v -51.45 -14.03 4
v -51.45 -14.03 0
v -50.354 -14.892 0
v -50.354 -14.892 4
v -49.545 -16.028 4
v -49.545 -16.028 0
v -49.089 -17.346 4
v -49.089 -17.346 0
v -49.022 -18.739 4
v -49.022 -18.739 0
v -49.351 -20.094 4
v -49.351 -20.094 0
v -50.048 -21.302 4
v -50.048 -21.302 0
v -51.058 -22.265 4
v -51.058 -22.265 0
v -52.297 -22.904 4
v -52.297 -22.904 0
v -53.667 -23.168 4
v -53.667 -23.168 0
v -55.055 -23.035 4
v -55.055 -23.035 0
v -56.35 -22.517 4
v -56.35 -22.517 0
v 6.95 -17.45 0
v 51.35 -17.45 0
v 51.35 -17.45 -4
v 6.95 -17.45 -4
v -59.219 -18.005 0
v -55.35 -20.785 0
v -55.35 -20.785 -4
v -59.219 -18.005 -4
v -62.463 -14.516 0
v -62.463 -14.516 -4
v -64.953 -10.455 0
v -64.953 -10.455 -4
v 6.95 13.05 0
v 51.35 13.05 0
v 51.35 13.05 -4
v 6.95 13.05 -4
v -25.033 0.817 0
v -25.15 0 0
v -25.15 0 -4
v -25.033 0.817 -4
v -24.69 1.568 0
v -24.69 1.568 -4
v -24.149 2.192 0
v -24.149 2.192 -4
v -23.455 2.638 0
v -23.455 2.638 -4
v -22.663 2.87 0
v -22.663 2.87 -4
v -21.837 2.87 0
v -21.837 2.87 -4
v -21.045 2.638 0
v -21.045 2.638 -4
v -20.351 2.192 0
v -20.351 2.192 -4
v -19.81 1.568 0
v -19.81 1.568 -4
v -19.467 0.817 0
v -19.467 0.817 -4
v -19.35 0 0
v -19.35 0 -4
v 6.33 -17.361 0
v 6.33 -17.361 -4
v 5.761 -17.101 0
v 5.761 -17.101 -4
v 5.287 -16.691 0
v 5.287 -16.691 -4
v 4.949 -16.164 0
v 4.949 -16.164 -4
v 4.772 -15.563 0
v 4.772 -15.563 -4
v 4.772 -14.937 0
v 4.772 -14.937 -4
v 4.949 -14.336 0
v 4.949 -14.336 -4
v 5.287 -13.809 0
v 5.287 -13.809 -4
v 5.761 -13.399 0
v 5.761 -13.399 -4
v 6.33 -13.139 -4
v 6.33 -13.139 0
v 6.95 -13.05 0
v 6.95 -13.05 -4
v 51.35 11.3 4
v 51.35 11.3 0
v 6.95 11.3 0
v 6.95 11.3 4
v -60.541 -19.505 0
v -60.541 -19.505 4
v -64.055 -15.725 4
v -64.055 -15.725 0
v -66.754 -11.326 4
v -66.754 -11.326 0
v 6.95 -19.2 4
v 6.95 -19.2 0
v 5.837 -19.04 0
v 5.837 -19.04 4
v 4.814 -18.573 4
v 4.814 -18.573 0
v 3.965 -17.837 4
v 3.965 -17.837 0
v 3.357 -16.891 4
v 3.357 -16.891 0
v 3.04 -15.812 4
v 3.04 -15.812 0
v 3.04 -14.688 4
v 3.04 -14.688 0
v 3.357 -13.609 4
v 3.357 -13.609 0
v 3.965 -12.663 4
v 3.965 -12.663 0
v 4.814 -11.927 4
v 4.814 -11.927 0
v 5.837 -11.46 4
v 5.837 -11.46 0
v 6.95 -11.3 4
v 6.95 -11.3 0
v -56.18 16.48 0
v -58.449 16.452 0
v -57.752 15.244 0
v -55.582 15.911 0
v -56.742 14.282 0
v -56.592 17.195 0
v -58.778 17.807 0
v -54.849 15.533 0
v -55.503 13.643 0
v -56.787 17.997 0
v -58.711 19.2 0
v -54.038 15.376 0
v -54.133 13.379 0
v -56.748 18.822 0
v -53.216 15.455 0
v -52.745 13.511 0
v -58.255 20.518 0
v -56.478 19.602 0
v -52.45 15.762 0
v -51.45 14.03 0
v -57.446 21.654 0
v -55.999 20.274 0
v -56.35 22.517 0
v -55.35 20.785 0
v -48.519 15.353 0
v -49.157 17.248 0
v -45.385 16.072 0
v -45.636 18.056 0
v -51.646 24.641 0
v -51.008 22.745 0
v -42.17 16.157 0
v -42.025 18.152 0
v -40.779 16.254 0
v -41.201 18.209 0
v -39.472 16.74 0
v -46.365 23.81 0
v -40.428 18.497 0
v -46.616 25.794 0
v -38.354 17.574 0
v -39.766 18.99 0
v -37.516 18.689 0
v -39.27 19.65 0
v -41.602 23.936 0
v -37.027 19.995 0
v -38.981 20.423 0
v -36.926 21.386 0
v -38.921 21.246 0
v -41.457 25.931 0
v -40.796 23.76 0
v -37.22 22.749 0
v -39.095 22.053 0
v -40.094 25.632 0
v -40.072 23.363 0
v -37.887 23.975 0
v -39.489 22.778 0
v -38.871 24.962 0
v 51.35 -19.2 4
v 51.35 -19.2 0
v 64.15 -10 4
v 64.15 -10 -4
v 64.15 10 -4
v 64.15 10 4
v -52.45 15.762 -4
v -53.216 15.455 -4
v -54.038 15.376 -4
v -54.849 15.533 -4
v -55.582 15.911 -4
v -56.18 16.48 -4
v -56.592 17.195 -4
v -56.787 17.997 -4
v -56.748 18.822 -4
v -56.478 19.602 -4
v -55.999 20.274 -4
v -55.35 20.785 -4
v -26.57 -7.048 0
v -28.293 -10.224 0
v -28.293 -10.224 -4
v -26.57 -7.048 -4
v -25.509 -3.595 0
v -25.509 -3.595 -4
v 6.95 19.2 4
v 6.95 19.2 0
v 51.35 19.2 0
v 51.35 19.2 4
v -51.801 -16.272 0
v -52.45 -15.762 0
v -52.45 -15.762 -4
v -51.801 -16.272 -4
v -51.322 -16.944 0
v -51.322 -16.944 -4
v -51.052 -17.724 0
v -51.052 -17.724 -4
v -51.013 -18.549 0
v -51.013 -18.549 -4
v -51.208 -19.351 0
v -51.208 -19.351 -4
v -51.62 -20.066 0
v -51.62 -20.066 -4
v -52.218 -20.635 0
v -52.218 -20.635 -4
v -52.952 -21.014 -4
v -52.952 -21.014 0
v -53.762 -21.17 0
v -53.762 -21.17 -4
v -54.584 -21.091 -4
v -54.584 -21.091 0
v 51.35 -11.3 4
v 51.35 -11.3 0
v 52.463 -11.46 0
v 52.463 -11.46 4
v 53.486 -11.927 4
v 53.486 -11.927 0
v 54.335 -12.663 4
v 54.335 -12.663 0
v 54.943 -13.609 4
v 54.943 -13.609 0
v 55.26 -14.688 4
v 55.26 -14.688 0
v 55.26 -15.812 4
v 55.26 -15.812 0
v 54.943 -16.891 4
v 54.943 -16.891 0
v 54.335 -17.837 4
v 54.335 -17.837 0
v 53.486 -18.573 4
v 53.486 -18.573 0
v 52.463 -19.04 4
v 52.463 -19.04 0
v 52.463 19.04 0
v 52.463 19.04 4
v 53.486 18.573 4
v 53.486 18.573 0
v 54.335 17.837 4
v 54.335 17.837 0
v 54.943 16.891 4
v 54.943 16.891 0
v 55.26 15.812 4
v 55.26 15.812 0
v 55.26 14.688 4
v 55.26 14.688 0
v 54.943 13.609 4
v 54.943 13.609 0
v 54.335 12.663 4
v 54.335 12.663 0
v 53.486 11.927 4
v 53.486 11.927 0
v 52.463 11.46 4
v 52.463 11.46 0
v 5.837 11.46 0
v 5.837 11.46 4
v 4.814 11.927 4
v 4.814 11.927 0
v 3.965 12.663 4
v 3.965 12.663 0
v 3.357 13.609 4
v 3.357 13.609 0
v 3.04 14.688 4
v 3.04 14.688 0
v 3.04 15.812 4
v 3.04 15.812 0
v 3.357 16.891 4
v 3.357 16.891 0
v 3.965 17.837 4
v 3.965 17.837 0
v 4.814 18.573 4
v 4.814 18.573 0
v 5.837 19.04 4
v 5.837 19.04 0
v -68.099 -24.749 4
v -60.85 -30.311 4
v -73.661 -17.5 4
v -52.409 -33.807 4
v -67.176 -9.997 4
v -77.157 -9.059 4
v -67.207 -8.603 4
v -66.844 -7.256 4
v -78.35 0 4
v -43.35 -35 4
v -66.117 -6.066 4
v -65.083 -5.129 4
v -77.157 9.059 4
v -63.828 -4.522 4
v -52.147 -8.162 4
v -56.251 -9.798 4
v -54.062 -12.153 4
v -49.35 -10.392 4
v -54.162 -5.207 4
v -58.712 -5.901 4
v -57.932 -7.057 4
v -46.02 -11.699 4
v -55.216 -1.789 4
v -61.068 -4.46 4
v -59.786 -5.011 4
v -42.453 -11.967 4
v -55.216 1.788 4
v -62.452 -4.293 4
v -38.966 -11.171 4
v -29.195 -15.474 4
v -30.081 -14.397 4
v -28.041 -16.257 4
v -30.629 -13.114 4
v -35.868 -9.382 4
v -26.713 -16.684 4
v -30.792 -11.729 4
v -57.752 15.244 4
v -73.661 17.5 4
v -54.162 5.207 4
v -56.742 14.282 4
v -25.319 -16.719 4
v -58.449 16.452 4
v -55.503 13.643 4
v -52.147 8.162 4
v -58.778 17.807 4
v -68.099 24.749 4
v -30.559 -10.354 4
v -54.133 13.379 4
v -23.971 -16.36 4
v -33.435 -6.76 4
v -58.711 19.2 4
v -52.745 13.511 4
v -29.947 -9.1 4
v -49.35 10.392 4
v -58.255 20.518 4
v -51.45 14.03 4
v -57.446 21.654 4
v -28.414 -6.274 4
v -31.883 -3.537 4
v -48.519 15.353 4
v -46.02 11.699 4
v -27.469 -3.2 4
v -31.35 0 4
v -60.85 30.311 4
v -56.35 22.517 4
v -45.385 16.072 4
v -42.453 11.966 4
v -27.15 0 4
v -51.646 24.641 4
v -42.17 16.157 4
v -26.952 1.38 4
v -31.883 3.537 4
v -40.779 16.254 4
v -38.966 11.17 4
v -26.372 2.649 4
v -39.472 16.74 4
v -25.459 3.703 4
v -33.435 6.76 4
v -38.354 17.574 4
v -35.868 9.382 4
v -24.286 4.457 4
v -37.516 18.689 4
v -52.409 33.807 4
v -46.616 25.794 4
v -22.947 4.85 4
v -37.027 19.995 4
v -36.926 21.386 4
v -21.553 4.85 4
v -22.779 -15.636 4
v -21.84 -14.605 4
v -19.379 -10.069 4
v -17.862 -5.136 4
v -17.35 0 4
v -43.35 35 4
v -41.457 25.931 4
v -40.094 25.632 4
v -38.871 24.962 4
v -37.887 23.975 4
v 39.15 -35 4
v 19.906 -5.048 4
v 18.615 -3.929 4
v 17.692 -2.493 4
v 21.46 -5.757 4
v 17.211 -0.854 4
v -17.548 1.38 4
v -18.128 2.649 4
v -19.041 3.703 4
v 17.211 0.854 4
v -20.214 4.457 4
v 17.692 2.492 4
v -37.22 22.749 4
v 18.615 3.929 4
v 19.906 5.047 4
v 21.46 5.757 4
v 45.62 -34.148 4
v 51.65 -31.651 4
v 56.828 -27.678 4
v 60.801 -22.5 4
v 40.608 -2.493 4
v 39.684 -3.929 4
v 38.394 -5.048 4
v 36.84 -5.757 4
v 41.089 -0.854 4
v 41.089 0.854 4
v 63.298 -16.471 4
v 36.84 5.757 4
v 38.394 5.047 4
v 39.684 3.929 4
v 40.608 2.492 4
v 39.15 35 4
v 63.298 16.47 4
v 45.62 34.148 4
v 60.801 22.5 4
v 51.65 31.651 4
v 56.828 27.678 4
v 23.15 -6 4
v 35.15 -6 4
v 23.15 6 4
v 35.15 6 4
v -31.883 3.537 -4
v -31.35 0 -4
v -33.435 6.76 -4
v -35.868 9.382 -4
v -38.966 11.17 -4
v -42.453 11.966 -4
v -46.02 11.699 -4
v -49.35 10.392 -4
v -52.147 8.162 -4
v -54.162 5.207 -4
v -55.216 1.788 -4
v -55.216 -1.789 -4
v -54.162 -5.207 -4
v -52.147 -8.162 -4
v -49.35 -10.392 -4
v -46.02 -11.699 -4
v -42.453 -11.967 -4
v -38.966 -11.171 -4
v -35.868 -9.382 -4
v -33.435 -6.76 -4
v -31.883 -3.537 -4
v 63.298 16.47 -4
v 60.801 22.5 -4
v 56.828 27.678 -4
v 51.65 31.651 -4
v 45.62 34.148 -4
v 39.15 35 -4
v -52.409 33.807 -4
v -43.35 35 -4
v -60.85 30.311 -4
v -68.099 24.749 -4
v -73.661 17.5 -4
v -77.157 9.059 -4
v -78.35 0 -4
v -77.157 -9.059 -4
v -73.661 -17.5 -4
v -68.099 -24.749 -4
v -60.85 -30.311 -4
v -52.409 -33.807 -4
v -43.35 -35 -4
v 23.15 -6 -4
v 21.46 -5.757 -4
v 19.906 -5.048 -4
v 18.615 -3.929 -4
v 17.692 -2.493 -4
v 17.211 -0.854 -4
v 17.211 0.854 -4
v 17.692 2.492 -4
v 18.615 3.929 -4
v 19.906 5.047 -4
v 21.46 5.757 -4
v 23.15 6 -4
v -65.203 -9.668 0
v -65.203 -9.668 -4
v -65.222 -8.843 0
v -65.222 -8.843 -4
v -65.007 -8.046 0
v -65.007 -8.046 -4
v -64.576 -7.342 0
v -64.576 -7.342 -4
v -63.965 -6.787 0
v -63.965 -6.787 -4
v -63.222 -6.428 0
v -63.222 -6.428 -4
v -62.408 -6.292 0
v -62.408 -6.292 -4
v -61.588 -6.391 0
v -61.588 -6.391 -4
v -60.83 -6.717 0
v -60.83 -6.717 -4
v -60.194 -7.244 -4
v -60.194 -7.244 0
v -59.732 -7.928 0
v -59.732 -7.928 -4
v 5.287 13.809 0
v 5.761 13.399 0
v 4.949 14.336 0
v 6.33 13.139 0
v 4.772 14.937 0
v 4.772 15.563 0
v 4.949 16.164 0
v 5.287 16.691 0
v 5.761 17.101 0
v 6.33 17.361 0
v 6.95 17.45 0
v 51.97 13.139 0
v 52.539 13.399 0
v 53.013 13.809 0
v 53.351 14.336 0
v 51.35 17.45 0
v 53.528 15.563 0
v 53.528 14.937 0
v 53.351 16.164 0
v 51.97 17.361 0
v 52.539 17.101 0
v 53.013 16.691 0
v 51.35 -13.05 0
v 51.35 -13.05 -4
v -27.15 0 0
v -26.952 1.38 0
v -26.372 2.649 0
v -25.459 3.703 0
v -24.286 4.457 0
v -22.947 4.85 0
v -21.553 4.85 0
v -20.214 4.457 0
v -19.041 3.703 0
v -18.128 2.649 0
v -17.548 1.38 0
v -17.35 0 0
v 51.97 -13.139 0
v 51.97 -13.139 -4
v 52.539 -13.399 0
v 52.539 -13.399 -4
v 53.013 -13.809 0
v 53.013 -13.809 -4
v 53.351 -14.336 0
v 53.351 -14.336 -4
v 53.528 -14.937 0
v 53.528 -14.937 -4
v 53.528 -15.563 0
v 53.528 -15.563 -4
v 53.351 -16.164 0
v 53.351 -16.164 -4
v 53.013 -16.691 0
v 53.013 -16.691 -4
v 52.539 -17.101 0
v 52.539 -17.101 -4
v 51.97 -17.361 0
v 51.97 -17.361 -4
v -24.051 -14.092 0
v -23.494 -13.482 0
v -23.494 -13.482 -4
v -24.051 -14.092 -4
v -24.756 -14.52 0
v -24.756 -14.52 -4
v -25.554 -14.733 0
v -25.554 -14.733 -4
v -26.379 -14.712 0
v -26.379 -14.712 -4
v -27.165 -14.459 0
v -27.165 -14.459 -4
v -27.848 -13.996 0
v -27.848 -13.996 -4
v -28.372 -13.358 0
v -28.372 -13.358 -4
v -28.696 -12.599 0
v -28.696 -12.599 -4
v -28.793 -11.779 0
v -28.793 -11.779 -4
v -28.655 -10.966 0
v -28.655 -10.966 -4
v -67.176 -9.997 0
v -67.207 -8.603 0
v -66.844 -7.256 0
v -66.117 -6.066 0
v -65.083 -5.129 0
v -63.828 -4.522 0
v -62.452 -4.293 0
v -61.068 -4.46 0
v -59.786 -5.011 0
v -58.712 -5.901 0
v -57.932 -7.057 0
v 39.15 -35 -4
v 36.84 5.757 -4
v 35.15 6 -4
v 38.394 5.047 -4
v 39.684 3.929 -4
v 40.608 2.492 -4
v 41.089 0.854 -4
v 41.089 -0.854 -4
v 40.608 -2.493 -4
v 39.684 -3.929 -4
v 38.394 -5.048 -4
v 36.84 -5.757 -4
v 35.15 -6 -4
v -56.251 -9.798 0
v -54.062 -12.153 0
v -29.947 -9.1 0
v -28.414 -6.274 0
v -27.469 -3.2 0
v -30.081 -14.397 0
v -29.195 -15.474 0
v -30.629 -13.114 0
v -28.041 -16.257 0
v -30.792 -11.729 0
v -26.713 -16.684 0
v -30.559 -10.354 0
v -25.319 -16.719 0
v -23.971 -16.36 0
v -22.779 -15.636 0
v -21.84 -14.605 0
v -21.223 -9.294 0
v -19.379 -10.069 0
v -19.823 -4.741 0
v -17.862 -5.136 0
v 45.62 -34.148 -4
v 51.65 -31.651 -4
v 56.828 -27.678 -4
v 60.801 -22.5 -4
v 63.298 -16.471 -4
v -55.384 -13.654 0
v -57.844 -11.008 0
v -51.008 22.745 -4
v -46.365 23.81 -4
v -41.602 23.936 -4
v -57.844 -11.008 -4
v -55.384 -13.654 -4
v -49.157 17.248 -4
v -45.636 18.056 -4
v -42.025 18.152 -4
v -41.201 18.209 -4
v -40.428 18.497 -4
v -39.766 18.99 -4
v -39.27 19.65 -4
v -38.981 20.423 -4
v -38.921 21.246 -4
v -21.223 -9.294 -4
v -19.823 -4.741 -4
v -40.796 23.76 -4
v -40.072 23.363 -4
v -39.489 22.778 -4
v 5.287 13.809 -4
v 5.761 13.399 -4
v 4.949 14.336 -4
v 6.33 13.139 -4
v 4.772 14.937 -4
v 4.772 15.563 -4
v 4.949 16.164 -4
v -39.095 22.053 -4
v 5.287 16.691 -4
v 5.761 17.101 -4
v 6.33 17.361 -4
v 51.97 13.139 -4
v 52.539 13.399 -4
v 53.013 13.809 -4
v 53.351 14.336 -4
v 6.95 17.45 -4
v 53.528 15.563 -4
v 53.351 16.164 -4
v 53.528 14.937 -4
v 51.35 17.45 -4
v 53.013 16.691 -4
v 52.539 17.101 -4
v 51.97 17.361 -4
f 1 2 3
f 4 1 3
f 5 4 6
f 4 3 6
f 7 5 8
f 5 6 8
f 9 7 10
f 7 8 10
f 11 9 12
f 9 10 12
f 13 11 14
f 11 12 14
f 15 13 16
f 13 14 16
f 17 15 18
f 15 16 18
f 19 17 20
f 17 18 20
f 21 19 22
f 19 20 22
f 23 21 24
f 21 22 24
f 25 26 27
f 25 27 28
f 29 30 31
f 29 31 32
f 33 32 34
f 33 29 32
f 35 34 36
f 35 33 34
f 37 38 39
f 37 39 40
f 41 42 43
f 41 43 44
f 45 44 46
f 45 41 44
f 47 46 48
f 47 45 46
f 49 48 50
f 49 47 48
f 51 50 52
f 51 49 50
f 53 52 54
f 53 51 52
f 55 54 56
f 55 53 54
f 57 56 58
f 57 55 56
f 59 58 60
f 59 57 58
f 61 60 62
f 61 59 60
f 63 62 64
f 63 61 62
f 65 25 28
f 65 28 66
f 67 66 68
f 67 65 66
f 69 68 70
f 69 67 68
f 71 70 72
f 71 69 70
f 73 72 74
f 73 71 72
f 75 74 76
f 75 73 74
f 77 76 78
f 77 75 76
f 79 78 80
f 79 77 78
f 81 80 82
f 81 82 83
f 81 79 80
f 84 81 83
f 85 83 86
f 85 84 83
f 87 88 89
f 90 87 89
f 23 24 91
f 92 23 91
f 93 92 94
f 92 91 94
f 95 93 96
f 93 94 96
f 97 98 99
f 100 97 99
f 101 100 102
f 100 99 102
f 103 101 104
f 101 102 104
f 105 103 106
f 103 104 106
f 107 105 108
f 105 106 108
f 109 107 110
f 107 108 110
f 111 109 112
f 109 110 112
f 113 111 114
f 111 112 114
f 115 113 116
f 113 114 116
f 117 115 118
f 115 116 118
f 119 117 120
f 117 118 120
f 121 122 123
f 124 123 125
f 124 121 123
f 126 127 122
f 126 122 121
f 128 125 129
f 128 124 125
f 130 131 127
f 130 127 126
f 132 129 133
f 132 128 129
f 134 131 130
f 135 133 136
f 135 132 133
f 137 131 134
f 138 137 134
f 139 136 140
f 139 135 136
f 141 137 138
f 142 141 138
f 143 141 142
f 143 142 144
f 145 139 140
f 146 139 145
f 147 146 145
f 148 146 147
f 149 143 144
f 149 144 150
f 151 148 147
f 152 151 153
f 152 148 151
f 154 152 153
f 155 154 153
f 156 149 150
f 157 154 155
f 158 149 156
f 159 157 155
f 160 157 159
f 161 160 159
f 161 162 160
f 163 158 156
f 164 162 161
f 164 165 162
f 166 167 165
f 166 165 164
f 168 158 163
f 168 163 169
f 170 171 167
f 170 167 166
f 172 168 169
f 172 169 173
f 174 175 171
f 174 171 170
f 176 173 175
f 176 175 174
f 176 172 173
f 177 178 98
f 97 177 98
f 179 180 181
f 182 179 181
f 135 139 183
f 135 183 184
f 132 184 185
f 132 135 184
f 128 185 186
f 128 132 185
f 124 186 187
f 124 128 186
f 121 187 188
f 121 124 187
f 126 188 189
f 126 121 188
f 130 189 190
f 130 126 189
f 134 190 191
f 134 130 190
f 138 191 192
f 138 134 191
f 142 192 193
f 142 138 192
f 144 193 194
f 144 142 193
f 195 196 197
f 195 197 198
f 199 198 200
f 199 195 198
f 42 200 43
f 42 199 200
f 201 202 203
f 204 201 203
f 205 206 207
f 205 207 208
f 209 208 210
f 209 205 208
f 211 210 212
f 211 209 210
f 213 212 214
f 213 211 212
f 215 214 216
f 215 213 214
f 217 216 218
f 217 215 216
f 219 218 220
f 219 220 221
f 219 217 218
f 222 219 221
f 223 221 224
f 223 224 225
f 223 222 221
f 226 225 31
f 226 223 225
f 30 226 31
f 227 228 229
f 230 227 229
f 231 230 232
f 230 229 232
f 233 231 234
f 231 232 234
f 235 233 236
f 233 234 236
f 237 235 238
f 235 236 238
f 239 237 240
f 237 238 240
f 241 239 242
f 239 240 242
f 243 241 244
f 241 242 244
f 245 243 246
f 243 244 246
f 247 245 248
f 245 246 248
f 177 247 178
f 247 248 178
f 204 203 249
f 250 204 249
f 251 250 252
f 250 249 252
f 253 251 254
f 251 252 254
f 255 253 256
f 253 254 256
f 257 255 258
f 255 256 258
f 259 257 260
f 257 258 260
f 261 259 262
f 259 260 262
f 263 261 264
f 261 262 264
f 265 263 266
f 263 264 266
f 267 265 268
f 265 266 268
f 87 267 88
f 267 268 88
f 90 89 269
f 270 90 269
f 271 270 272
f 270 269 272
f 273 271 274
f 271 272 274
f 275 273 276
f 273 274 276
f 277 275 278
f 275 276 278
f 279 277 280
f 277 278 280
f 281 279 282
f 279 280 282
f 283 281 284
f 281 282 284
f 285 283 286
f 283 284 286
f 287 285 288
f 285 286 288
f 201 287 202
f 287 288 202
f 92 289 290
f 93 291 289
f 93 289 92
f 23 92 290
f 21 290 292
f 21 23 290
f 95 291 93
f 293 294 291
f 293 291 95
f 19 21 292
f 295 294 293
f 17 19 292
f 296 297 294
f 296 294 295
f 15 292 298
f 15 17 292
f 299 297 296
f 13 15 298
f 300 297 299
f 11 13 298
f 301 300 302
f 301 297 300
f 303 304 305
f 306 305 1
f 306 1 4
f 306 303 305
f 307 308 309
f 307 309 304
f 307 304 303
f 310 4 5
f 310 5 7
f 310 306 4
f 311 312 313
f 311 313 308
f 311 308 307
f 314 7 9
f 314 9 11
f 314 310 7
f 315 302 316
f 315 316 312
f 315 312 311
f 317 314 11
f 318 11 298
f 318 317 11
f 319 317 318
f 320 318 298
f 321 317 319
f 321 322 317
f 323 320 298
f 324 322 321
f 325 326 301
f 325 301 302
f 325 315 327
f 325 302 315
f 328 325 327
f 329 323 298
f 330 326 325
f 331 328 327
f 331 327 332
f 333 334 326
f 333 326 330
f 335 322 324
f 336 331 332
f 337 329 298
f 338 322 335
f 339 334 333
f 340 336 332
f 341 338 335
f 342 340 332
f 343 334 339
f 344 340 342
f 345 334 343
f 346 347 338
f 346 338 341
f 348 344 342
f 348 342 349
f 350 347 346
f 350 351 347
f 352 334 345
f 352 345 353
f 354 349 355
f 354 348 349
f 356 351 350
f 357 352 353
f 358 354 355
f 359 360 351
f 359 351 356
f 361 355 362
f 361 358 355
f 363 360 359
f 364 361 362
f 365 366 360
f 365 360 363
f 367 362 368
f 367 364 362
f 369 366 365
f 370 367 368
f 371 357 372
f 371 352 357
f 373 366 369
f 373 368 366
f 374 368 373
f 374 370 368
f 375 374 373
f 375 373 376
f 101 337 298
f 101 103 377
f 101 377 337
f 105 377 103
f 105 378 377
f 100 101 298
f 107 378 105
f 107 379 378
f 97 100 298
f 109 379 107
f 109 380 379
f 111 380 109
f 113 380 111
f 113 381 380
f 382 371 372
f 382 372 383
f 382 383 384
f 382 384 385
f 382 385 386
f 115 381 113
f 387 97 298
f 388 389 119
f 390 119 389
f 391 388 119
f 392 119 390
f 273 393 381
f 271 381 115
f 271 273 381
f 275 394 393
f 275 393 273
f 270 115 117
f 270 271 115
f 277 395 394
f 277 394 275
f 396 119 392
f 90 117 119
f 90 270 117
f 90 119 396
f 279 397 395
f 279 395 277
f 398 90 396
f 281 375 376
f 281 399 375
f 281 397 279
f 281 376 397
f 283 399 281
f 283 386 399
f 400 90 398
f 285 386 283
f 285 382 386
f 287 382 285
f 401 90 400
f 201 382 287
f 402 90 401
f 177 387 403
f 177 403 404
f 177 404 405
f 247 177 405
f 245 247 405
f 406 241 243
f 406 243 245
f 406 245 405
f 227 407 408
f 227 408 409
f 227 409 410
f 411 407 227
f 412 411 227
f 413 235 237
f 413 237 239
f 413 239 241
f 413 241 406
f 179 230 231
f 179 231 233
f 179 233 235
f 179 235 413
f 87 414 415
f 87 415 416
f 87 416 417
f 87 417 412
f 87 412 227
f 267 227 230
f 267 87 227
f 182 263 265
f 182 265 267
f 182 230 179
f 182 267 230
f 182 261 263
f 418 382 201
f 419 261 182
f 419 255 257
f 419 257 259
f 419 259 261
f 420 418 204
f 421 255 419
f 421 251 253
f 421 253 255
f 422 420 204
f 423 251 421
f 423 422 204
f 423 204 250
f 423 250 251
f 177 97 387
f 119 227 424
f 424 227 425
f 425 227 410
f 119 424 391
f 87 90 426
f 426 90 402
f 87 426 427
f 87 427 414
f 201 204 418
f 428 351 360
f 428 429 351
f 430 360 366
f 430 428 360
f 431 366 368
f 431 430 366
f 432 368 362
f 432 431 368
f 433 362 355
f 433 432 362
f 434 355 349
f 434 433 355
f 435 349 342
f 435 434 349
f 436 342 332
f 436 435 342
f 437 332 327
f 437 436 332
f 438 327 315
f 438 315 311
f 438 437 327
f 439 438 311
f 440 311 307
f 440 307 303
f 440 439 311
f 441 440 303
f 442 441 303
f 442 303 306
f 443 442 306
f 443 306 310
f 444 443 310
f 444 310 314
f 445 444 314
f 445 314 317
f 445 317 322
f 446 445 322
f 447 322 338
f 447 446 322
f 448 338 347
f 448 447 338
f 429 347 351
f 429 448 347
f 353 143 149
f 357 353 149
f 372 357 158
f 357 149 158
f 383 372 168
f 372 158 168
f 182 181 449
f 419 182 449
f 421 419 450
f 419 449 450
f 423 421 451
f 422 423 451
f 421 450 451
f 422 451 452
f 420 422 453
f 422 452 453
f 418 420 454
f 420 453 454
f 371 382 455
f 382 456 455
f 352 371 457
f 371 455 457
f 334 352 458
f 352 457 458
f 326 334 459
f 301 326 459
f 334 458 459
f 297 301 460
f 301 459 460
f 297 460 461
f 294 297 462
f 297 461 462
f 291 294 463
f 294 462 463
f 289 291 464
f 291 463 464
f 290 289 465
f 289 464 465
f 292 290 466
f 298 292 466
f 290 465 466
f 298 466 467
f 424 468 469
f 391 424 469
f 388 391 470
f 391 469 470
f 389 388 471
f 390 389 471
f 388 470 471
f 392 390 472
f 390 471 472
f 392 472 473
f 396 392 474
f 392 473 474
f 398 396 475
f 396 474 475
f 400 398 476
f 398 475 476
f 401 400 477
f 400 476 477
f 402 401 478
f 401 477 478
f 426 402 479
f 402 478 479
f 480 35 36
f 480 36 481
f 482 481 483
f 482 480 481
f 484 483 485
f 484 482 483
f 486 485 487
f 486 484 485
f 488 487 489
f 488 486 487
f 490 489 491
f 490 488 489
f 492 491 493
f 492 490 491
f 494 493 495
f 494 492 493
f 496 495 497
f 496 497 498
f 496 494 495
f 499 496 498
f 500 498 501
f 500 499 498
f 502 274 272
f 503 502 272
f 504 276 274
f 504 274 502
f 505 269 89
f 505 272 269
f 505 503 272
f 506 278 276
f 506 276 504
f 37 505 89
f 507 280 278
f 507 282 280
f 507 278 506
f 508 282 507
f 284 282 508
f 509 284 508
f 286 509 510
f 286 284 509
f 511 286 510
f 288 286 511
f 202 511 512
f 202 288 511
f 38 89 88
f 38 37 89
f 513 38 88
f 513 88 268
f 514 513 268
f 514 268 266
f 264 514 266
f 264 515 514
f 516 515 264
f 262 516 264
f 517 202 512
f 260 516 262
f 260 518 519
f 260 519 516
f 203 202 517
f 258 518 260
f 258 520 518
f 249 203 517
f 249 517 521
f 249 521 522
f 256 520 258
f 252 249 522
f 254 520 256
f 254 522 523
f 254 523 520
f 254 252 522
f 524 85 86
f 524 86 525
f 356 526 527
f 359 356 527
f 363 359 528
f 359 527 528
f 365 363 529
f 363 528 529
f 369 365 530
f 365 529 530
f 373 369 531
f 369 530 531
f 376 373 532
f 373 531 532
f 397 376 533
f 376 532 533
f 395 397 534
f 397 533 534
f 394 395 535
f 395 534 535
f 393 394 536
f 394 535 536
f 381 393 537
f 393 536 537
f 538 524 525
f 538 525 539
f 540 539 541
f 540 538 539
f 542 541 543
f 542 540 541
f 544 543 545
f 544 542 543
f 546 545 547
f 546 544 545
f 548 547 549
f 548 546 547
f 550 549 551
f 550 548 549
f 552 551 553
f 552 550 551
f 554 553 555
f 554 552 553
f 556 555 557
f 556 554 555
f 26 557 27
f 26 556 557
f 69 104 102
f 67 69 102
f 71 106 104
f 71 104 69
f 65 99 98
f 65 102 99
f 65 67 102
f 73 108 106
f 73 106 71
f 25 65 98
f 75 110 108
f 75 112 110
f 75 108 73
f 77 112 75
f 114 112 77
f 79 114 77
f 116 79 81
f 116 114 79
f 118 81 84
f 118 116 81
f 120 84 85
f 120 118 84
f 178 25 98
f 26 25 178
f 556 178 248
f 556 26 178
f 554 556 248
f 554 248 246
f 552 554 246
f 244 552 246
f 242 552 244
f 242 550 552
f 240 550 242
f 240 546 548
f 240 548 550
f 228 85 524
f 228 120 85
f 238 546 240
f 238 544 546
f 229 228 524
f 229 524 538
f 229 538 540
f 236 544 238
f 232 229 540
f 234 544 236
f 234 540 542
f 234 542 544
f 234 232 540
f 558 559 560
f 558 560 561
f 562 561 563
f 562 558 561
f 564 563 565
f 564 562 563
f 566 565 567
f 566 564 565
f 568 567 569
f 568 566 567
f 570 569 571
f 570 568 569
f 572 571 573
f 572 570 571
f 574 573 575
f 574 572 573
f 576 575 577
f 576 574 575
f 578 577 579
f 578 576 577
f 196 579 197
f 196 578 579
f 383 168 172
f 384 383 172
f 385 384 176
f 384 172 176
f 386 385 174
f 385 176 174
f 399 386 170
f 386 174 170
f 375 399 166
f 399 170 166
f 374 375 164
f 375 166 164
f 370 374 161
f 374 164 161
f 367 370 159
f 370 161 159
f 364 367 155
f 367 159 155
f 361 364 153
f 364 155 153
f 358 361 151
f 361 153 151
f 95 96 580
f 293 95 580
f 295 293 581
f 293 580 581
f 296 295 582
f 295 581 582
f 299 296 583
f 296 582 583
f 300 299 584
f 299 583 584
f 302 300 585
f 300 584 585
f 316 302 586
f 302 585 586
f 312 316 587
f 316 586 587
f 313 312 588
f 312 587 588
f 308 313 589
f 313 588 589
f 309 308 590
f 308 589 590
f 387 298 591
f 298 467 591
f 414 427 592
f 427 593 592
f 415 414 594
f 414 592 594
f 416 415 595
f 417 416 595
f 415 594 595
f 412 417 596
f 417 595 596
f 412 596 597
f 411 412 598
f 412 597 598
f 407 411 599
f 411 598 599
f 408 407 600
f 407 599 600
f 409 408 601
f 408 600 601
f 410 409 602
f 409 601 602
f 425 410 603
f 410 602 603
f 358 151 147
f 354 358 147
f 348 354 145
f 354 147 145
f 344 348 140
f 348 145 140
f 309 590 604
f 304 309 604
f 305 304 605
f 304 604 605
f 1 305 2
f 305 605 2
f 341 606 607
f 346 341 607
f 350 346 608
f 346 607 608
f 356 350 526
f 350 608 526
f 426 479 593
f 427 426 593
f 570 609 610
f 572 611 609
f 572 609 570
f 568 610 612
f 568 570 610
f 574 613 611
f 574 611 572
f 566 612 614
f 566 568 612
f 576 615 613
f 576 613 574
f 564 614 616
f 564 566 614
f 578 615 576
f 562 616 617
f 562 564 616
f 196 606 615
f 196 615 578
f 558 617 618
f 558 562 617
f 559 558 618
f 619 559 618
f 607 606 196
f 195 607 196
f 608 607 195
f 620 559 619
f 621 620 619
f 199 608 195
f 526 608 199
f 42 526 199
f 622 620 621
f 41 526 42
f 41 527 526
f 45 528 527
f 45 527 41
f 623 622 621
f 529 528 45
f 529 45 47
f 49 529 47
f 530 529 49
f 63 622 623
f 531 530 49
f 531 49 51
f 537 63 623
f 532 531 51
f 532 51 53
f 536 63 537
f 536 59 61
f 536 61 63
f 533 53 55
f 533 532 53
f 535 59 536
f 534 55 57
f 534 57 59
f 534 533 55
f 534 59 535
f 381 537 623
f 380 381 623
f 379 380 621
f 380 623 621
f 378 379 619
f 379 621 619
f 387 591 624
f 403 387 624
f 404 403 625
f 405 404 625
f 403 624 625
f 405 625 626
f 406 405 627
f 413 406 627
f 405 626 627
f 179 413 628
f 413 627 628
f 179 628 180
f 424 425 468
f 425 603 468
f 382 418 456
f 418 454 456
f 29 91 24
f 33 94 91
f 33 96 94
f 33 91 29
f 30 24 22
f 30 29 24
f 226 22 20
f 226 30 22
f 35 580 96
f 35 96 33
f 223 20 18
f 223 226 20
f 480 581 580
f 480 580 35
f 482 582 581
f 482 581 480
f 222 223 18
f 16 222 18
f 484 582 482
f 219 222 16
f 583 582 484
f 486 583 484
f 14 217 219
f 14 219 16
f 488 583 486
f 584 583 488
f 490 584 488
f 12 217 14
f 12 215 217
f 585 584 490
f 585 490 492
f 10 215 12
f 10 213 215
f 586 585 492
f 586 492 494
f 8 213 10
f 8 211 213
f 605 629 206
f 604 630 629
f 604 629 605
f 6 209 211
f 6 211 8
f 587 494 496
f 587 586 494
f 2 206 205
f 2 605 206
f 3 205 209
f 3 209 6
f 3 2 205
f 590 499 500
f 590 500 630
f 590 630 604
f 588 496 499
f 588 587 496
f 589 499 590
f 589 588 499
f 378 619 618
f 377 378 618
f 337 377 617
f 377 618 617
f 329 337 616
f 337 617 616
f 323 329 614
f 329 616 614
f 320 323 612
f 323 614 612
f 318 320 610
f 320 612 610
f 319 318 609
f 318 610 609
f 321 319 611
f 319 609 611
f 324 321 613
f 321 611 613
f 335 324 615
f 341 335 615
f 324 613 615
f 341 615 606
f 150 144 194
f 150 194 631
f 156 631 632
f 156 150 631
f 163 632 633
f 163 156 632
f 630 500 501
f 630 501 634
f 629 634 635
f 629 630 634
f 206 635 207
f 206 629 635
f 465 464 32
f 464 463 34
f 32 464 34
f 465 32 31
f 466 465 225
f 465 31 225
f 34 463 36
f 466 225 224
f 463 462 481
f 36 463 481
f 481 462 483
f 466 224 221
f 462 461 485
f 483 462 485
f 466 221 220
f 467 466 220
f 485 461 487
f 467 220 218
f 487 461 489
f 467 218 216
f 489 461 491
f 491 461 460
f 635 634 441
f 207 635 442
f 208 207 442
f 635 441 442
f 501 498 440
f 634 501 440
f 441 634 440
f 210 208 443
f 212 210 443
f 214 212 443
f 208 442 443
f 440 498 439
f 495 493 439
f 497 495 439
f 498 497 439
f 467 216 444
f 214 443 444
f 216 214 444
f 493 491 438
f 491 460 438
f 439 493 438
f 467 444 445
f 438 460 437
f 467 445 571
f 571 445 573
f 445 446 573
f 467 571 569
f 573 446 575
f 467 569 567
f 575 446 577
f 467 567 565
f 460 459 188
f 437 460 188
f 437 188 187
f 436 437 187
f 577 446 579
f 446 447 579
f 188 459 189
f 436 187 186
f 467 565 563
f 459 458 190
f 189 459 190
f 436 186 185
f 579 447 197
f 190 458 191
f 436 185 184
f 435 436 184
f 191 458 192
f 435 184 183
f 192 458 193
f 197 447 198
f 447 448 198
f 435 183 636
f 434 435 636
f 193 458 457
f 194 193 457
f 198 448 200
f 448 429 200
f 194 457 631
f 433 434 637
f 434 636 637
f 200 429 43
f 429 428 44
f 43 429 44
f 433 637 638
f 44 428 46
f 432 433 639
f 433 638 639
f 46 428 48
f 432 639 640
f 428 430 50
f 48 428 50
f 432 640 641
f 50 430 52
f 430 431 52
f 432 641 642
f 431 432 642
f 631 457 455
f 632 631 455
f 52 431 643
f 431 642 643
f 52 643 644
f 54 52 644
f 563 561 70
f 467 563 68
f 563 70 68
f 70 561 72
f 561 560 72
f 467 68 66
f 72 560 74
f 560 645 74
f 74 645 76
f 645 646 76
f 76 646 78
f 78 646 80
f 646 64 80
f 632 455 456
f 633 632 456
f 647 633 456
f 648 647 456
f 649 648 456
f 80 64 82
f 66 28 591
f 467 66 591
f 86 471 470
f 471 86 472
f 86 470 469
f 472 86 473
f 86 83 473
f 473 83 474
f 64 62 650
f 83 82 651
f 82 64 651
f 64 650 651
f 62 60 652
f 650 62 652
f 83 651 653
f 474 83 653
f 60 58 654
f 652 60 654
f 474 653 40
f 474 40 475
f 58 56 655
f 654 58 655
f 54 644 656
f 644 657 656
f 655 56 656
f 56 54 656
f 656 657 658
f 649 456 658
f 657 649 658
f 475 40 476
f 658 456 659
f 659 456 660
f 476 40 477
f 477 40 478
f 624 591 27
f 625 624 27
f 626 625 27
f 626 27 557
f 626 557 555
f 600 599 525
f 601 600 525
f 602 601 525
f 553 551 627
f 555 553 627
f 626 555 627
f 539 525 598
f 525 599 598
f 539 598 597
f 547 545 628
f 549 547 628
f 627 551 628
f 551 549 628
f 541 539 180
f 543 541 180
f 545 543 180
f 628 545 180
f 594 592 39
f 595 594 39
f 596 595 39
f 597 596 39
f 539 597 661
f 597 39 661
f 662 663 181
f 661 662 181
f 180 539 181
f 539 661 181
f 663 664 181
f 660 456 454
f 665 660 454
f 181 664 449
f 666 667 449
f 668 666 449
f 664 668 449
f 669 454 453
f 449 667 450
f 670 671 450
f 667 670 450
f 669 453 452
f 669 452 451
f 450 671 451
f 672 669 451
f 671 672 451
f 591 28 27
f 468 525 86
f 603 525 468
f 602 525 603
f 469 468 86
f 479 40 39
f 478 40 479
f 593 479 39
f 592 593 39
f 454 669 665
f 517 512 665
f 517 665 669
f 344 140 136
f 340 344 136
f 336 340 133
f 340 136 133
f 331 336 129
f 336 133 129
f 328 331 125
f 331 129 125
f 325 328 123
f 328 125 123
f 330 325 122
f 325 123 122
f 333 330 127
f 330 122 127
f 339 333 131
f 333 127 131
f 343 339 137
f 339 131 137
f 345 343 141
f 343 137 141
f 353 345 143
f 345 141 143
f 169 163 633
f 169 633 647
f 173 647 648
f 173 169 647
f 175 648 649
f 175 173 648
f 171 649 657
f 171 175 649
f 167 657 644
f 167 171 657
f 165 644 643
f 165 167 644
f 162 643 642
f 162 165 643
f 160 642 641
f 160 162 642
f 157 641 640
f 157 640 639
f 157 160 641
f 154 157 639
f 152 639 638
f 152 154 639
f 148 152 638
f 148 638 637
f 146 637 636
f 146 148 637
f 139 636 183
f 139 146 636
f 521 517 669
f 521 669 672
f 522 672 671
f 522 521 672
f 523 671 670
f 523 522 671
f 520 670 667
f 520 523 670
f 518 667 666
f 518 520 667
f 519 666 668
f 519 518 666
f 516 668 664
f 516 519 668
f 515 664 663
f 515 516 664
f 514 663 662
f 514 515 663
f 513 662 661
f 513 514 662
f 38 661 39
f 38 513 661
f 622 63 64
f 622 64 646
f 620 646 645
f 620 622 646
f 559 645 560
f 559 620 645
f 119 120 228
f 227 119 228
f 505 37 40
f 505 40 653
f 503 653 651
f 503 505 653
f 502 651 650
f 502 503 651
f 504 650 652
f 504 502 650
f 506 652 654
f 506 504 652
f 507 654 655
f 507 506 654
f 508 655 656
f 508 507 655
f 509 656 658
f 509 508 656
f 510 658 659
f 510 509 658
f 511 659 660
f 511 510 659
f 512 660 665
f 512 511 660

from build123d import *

# Parameters (mm, degrees)
F0_R     = 12
F1_DEPTH = 4
F2_DEPTH = 4


# Not quite as in the source:
# - a feature names something its author has since deleted; it is built from what else it names


with BuildPart() as f1:
    # F0 (on Top) → F1 (new body)
    with BuildSketch(Plane.XY):
        with BuildLine():
            ThreePointArc((64.1499952853, 9.9999063548), (56.8276648149, 27.6775758844), (39.1499952853, 34.9999063548))
            Line((39.1499952853, 34.9999063548), (-43.3500047147, 34.9999063548))
            ThreePointArc((-43.3500047147, 34.9999063548), (-78.3500047147, -9.36452e-05), (-43.3500047147, -35.0000936452))
            Line((-43.3500047147, -35.0000936452), (39.1499952853, -35.0000936452))
            ThreePointArc((39.1499952853, -35.0000936452), (56.8276648149, -27.6777631749), (64.1499952853, -10.0000936452))
            Line((64.1499952853, -10.0000936452), (64.1499952853, 9.9999063548))
        make_face()
        with BuildLine():
            ThreePointArc((-66.7535204548, -11.3259689317), (-64.4773497539, -4.780814469), (-57.9321952912, -7.0569851699))
            ThreePointArc((-57.9321952912, -7.0569851699), (-55.2148750657, -11.0302727714), (-51.4500047147, -14.0297051866))
            ThreePointArc((-51.4500047147, -14.0297051866), (-49.6564802362, -20.7232296651), (-56.3500047147, -22.5167541436))
            ThreePointArc((-56.3500047147, -22.5167541436), (-62.3923892286, -17.7028502675), (-66.7535204548, -11.3259689317))
        make_face(mode=Mode.SUBTRACT)
        with BuildLine():
            ThreePointArc((-21.8397511265, -14.6051951708), (-28.6461065134, -15.9065507518), (-29.9474620944, -9.100195365))
            ThreePointArc((-29.9474620944, -9.100195365), (-27.8651542077, -4.7602832187), (-27.1500047147, -9.36452e-05))
            ThreePointArc((-27.1500047147, -9.36452e-05), (-22.2500047147, 4.8999063548), (-17.3500047147, -9.36452e-05))
            ThreePointArc((-17.3500047147, -9.36452e-05), (-18.4977755059, -7.6399040718), (-21.8397511265, -14.6051951708))
        make_face(mode=Mode.SUBTRACT)
        with BuildLine():
            ThreePointArc((6.9499952853, -19.2000936452), (2.9999952853, -15.2500936452), (6.9499952853, -11.3000936452))
            Line((6.9499952853, -11.3000936452), (29.1499952853, -11.3000936452))
            Line((29.1499952853, -11.3000936452), (51.3499952853, -11.3000936452))
            ThreePointArc((51.3499952853, -11.3000936452), (55.2999952853, -15.2500936452), (51.3499952853, -19.2000936452))
            Line((51.3499952853, -19.2000936452), (29.1499952853, -19.2000936452))
            Line((29.1499952853, -19.2000936452), (6.9499952853, -19.2000936452))
        make_face(mode=Mode.SUBTRACT)
        with Locations((-43.3500047147, -9.36452e-05)):
            Circle(F0_R, mode=Mode.SUBTRACT)
        with BuildLine():
            ThreePointArc((-51.4500047147, 14.0295178961), (-58.1435291933, 15.8230423746), (-56.3500047147, 22.5165668531))
            ThreePointArc((-56.3500047147, 22.5165668531), (-49.1598494096, 25.3424734035), (-41.4567425628, 25.9308831667))
            ThreePointArc((-41.4567425628, 25.9308831667), (-36.9265578769, 20.6870842851), (-42.1703567586, 16.1568995991))
            ThreePointArc((-42.1703567586, 16.1568995991), (-46.9699848708, 15.7902750544), (-51.4500047147, 14.0295178961))
        make_face(mode=Mode.SUBTRACT)
        with BuildLine():
            Line((29.1499952853, 5.9999063548), (35.1499952853, 5.9999063548))
            ThreePointArc((35.1499952853, 5.9999063548), (41.1499952853, -9.36452e-05), (35.1499952853, -6.0000936452))
            Line((35.1499952853, -6.0000936452), (29.1499952853, -6.0000936452))
            Line((29.1499952853, -6.0000936452), (23.1499952853, -6.0000936452))
            ThreePointArc((23.1499952853, -6.0000936452), (17.1499952853, -9.36452e-05), (23.1499952853, 5.9999063548))
            Line((23.1499952853, 5.9999063548), (29.1499952853, 5.9999063548))
        make_face(mode=Mode.SUBTRACT)
        with BuildLine():
            Line((29.1499952853, 11.2999063548), (6.9499952853, 11.2999063548))
            ThreePointArc((6.9499952853, 11.2999063548), (2.9999952853, 15.2499063548), (6.9499952853, 19.1999063548))
            Line((6.9499952853, 19.1999063548), (29.1499952853, 19.1999063548))
            Line((29.1499952853, 19.1999063548), (51.3499952853, 19.1999063548))
            ThreePointArc((51.3499952853, 19.1999063548), (55.2999952853, 15.2499063548), (51.3499952853, 11.2999063548))
            Line((51.3499952853, 11.2999063548), (29.1499952853, 11.2999063548))
        make_face(mode=Mode.SUBTRACT)
        with BuildLine():
            ThreePointArc((-41.4567425628, 25.9308831667), (-49.1598494096, 25.3424734035), (-56.3500047147, 22.5165668531))
            ThreePointArc((-56.3500047147, 22.5165668531), (-58.1435291933, 15.8230423746), (-51.4500047147, 14.0295178961))
            ThreePointArc((-51.4500047147, 14.0295178961), (-46.9699848708, 15.7902750544), (-42.1703567586, 16.1568995991))
            ThreePointArc((-42.1703567586, 16.1568995991), (-36.9265578769, 20.6870842851), (-41.4567425628, 25.9308831667))
        make_face()
        with BuildLine():
            ThreePointArc((-52.4500047147, 15.7615687036), (-56.4114783857, 16.8230423746), (-55.3500047147, 20.7845160456))
            ThreePointArc((-55.3500047147, 20.7845160456), (-48.7129382793, 23.393045169), (-41.602378113, 23.9361926427))
            ThreePointArc((-41.602378113, 23.9361926427), (-38.9212484009, 20.8327198352), (-42.0247212084, 18.1515901231))
            ThreePointArc((-42.0247212084, 18.1515901231), (-47.4168960012, 17.7397032889), (-52.4500047147, 15.7615687036))
        make_face(mode=Mode.SUBTRACT)
        with BuildLine():
            ThreePointArc((-27.1500047147, -9.36452e-05), (-27.8651542077, -4.7602832187), (-29.9474620944, -9.100195365))
            ThreePointArc((-29.9474620944, -9.100195365), (-28.6461065134, -15.9065507518), (-21.8397511265, -14.6051951708))
            ThreePointArc((-21.8397511265, -14.6051951708), (-18.4977755059, -7.6399040718), (-17.3500047147, -9.36452e-05))
            ThreePointArc((-17.3500047147, -9.36452e-05), (-22.2500047147, 4.8999063548), (-27.1500047147, -9.36452e-05))
        make_face()
        with BuildLine():
            ThreePointArc((-23.4943860179, -13.4817258227), (-27.5226371652, -14.2519158604), (-28.292827203, -10.2236647131))
            ThreePointArc((-28.292827203, -10.2236647131), (-25.9534442686, -5.3479609438), (-25.1500047147, -9.36452e-05))
            ThreePointArc((-25.1500047147, -9.36452e-05), (-22.2500047147, 2.8999063548), (-19.3500047147, -9.36452e-05))
            ThreePointArc((-19.3500047147, -9.36452e-05), (-20.4094854451, -7.0522263467), (-23.4943860179, -13.4817258227))
        make_face(mode=Mode.SUBTRACT)
        with BuildLine():
            ThreePointArc((-51.4500047147, -14.0297051866), (-55.2148750657, -11.0302727714), (-57.9321952912, -7.0569851699))
            ThreePointArc((-57.9321952912, -7.0569851699), (-64.4773497539, -4.780814469), (-66.7535204548, -11.3259689317))
            ThreePointArc((-66.7535204548, -11.3259689317), (-62.3923892286, -17.7028502675), (-56.3500047147, -22.5167541436))
            ThreePointArc((-56.3500047147, -22.5167541436), (-49.6564802362, -20.7232296651), (-51.4500047147, -14.0297051866))
        make_face()
        with BuildLine():
            ThreePointArc((-64.9532500133, -10.4547477558), (-63.606128578, -6.5810849105), (-59.7324657328, -7.9282063458))
            ThreePointArc((-59.7324657328, -7.9282063458), (-56.6796738744, -12.3920232808), (-52.4500047147, -15.7617559941))
            ThreePointArc((-52.4500047147, -15.7617559941), (-51.3885310438, -19.7232296651), (-55.3500047147, -20.7847033361))
            ThreePointArc((-55.3500047147, -20.7847033361), (-60.9275904198, -16.3410997581), (-64.9532500133, -10.4547477558))
        make_face(mode=Mode.SUBTRACT)
        with BuildLine():
            ThreePointArc((6.9499952853, 19.1999063548), (2.9999952853, 15.2499063548), (6.9499952853, 11.2999063548))
            Line((6.9499952853, 11.2999063548), (29.1499952853, 11.2999063548))
            Line((29.1499952853, 11.2999063548), (51.3499952853, 11.2999063548))
            ThreePointArc((51.3499952853, 11.2999063548), (55.2999952853, 15.2499063548), (51.3499952853, 19.1999063548))
            Line((51.3499952853, 19.1999063548), (29.1499952853, 19.1999063548))
            Line((29.1499952853, 19.1999063548), (6.9499952853, 19.1999063548))
        make_face()
        with BuildLine():
            Line((29.1499952853, 13.0499063548), (6.9499952853, 13.0499063548))
            ThreePointArc((6.9499952853, 13.0499063548), (4.7499952853, 15.2499063548), (6.9499952853, 17.4499063548))
            Line((6.9499952853, 17.4499063548), (29.1499952853, 17.4499063548))
            Line((29.1499952853, 17.4499063548), (51.3499952853, 17.4499063548))
            ThreePointArc((51.3499952853, 17.4499063548), (53.5499952853, 15.2499063548), (51.3499952853, 13.0499063548))
            Line((51.3499952853, 13.0499063548), (29.1499952853, 13.0499063548))
        make_face(mode=Mode.SUBTRACT)
        with BuildLine():
            Line((29.1499952853, -11.3000936452), (6.9499952853, -11.3000936452))
            ThreePointArc((6.9499952853, -11.3000936452), (2.9999952853, -15.2500936452), (6.9499952853, -19.2000936452))
            Line((6.9499952853, -19.2000936452), (29.1499952853, -19.2000936452))
            Line((29.1499952853, -19.2000936452), (51.3499952853, -19.2000936452))
            ThreePointArc((51.3499952853, -19.2000936452), (55.2999952853, -15.2500936452), (51.3499952853, -11.3000936452))
            Line((51.3499952853, -11.3000936452), (29.1499952853, -11.3000936452))
        make_face()
        with BuildLine():
            ThreePointArc((6.9499952853, -17.4500936452), (4.7499952853, -15.2500936452), (6.9499952853, -13.0500936452))
            Line((6.9499952853, -13.0500936452), (29.1499952853, -13.0500936452))
            Line((29.1499952853, -13.0500936452), (51.3499952853, -13.0500936452))
            ThreePointArc((51.3499952853, -13.0500936452), (53.5499952853, -15.2500936452), (51.3499952853, -17.4500936452))
            Line((51.3499952853, -17.4500936452), (29.1499952853, -17.4500936452))
            Line((29.1499952853, -17.4500936452), (6.9499952853, -17.4500936452))
        make_face(mode=Mode.SUBTRACT)
    extrude(amount=-F1_DEPTH)

    # F0 (on Top) → F2 (join)
    with BuildSketch(Plane.XY):
        with BuildLine():
            ThreePointArc((64.1499952853, 9.9999063548), (56.8276648149, 27.6775758844), (39.1499952853, 34.9999063548))
            Line((39.1499952853, 34.9999063548), (-43.3500047147, 34.9999063548))
            ThreePointArc((-43.3500047147, 34.9999063548), (-78.3500047147, -9.36452e-05), (-43.3500047147, -35.0000936452))
            Line((-43.3500047147, -35.0000936452), (39.1499952853, -35.0000936452))
            ThreePointArc((39.1499952853, -35.0000936452), (56.8276648149, -27.6777631749), (64.1499952853, -10.0000936452))
            Line((64.1499952853, -10.0000936452), (64.1499952853, 9.9999063548))
        make_face()
        with BuildLine():
            ThreePointArc((-66.7535204548, -11.3259689317), (-64.4773497539, -4.780814469), (-57.9321952912, -7.0569851699))
            ThreePointArc((-57.9321952912, -7.0569851699), (-55.2148750657, -11.0302727714), (-51.4500047147, -14.0297051866))
            ThreePointArc((-51.4500047147, -14.0297051866), (-49.6564802362, -20.7232296651), (-56.3500047147, -22.5167541436))
            ThreePointArc((-56.3500047147, -22.5167541436), (-62.3923892286, -17.7028502675), (-66.7535204548, -11.3259689317))
        make_face(mode=Mode.SUBTRACT)
        with BuildLine():
            ThreePointArc((-21.8397511265, -14.6051951708), (-28.6461065134, -15.9065507518), (-29.9474620944, -9.100195365))
            ThreePointArc((-29.9474620944, -9.100195365), (-27.8651542077, -4.7602832187), (-27.1500047147, -9.36452e-05))
            ThreePointArc((-27.1500047147, -9.36452e-05), (-22.2500047147, 4.8999063548), (-17.3500047147, -9.36452e-05))
            ThreePointArc((-17.3500047147, -9.36452e-05), (-18.4977755059, -7.6399040718), (-21.8397511265, -14.6051951708))
        make_face(mode=Mode.SUBTRACT)
        with BuildLine():
            ThreePointArc((6.9499952853, -19.2000936452), (2.9999952853, -15.2500936452), (6.9499952853, -11.3000936452))
            Line((6.9499952853, -11.3000936452), (29.1499952853, -11.3000936452))
            Line((29.1499952853, -11.3000936452), (51.3499952853, -11.3000936452))
            ThreePointArc((51.3499952853, -11.3000936452), (55.2999952853, -15.2500936452), (51.3499952853, -19.2000936452))
            Line((51.3499952853, -19.2000936452), (29.1499952853, -19.2000936452))
            Line((29.1499952853, -19.2000936452), (6.9499952853, -19.2000936452))
        make_face(mode=Mode.SUBTRACT)
        with Locations((-43.3500047147, -9.36452e-05)):
            Circle(F0_R, mode=Mode.SUBTRACT)
        with BuildLine():
            ThreePointArc((-51.4500047147, 14.0295178961), (-58.1435291933, 15.8230423746), (-56.3500047147, 22.5165668531))
            ThreePointArc((-56.3500047147, 22.5165668531), (-49.1598494096, 25.3424734035), (-41.4567425628, 25.9308831667))
            ThreePointArc((-41.4567425628, 25.9308831667), (-36.9265578769, 20.6870842851), (-42.1703567586, 16.1568995991))
            ThreePointArc((-42.1703567586, 16.1568995991), (-46.9699848708, 15.7902750544), (-51.4500047147, 14.0295178961))
        make_face(mode=Mode.SUBTRACT)
        with BuildLine():
            Line((29.1499952853, 5.9999063548), (35.1499952853, 5.9999063548))
            ThreePointArc((35.1499952853, 5.9999063548), (41.1499952853, -9.36452e-05), (35.1499952853, -6.0000936452))
            Line((35.1499952853, -6.0000936452), (29.1499952853, -6.0000936452))
            Line((29.1499952853, -6.0000936452), (23.1499952853, -6.0000936452))
            ThreePointArc((23.1499952853, -6.0000936452), (17.1499952853, -9.36452e-05), (23.1499952853, 5.9999063548))
            Line((23.1499952853, 5.9999063548), (29.1499952853, 5.9999063548))
        make_face(mode=Mode.SUBTRACT)
        with BuildLine():
            Line((29.1499952853, 11.2999063548), (6.9499952853, 11.2999063548))
            ThreePointArc((6.9499952853, 11.2999063548), (2.9999952853, 15.2499063548), (6.9499952853, 19.1999063548))
            Line((6.9499952853, 19.1999063548), (29.1499952853, 19.1999063548))
            Line((29.1499952853, 19.1999063548), (51.3499952853, 19.1999063548))
            ThreePointArc((51.3499952853, 19.1999063548), (55.2999952853, 15.2499063548), (51.3499952853, 11.2999063548))
            Line((51.3499952853, 11.2999063548), (29.1499952853, 11.2999063548))
        make_face(mode=Mode.SUBTRACT)
    extrude(amount=F2_DEPTH)


solid = f1.part
